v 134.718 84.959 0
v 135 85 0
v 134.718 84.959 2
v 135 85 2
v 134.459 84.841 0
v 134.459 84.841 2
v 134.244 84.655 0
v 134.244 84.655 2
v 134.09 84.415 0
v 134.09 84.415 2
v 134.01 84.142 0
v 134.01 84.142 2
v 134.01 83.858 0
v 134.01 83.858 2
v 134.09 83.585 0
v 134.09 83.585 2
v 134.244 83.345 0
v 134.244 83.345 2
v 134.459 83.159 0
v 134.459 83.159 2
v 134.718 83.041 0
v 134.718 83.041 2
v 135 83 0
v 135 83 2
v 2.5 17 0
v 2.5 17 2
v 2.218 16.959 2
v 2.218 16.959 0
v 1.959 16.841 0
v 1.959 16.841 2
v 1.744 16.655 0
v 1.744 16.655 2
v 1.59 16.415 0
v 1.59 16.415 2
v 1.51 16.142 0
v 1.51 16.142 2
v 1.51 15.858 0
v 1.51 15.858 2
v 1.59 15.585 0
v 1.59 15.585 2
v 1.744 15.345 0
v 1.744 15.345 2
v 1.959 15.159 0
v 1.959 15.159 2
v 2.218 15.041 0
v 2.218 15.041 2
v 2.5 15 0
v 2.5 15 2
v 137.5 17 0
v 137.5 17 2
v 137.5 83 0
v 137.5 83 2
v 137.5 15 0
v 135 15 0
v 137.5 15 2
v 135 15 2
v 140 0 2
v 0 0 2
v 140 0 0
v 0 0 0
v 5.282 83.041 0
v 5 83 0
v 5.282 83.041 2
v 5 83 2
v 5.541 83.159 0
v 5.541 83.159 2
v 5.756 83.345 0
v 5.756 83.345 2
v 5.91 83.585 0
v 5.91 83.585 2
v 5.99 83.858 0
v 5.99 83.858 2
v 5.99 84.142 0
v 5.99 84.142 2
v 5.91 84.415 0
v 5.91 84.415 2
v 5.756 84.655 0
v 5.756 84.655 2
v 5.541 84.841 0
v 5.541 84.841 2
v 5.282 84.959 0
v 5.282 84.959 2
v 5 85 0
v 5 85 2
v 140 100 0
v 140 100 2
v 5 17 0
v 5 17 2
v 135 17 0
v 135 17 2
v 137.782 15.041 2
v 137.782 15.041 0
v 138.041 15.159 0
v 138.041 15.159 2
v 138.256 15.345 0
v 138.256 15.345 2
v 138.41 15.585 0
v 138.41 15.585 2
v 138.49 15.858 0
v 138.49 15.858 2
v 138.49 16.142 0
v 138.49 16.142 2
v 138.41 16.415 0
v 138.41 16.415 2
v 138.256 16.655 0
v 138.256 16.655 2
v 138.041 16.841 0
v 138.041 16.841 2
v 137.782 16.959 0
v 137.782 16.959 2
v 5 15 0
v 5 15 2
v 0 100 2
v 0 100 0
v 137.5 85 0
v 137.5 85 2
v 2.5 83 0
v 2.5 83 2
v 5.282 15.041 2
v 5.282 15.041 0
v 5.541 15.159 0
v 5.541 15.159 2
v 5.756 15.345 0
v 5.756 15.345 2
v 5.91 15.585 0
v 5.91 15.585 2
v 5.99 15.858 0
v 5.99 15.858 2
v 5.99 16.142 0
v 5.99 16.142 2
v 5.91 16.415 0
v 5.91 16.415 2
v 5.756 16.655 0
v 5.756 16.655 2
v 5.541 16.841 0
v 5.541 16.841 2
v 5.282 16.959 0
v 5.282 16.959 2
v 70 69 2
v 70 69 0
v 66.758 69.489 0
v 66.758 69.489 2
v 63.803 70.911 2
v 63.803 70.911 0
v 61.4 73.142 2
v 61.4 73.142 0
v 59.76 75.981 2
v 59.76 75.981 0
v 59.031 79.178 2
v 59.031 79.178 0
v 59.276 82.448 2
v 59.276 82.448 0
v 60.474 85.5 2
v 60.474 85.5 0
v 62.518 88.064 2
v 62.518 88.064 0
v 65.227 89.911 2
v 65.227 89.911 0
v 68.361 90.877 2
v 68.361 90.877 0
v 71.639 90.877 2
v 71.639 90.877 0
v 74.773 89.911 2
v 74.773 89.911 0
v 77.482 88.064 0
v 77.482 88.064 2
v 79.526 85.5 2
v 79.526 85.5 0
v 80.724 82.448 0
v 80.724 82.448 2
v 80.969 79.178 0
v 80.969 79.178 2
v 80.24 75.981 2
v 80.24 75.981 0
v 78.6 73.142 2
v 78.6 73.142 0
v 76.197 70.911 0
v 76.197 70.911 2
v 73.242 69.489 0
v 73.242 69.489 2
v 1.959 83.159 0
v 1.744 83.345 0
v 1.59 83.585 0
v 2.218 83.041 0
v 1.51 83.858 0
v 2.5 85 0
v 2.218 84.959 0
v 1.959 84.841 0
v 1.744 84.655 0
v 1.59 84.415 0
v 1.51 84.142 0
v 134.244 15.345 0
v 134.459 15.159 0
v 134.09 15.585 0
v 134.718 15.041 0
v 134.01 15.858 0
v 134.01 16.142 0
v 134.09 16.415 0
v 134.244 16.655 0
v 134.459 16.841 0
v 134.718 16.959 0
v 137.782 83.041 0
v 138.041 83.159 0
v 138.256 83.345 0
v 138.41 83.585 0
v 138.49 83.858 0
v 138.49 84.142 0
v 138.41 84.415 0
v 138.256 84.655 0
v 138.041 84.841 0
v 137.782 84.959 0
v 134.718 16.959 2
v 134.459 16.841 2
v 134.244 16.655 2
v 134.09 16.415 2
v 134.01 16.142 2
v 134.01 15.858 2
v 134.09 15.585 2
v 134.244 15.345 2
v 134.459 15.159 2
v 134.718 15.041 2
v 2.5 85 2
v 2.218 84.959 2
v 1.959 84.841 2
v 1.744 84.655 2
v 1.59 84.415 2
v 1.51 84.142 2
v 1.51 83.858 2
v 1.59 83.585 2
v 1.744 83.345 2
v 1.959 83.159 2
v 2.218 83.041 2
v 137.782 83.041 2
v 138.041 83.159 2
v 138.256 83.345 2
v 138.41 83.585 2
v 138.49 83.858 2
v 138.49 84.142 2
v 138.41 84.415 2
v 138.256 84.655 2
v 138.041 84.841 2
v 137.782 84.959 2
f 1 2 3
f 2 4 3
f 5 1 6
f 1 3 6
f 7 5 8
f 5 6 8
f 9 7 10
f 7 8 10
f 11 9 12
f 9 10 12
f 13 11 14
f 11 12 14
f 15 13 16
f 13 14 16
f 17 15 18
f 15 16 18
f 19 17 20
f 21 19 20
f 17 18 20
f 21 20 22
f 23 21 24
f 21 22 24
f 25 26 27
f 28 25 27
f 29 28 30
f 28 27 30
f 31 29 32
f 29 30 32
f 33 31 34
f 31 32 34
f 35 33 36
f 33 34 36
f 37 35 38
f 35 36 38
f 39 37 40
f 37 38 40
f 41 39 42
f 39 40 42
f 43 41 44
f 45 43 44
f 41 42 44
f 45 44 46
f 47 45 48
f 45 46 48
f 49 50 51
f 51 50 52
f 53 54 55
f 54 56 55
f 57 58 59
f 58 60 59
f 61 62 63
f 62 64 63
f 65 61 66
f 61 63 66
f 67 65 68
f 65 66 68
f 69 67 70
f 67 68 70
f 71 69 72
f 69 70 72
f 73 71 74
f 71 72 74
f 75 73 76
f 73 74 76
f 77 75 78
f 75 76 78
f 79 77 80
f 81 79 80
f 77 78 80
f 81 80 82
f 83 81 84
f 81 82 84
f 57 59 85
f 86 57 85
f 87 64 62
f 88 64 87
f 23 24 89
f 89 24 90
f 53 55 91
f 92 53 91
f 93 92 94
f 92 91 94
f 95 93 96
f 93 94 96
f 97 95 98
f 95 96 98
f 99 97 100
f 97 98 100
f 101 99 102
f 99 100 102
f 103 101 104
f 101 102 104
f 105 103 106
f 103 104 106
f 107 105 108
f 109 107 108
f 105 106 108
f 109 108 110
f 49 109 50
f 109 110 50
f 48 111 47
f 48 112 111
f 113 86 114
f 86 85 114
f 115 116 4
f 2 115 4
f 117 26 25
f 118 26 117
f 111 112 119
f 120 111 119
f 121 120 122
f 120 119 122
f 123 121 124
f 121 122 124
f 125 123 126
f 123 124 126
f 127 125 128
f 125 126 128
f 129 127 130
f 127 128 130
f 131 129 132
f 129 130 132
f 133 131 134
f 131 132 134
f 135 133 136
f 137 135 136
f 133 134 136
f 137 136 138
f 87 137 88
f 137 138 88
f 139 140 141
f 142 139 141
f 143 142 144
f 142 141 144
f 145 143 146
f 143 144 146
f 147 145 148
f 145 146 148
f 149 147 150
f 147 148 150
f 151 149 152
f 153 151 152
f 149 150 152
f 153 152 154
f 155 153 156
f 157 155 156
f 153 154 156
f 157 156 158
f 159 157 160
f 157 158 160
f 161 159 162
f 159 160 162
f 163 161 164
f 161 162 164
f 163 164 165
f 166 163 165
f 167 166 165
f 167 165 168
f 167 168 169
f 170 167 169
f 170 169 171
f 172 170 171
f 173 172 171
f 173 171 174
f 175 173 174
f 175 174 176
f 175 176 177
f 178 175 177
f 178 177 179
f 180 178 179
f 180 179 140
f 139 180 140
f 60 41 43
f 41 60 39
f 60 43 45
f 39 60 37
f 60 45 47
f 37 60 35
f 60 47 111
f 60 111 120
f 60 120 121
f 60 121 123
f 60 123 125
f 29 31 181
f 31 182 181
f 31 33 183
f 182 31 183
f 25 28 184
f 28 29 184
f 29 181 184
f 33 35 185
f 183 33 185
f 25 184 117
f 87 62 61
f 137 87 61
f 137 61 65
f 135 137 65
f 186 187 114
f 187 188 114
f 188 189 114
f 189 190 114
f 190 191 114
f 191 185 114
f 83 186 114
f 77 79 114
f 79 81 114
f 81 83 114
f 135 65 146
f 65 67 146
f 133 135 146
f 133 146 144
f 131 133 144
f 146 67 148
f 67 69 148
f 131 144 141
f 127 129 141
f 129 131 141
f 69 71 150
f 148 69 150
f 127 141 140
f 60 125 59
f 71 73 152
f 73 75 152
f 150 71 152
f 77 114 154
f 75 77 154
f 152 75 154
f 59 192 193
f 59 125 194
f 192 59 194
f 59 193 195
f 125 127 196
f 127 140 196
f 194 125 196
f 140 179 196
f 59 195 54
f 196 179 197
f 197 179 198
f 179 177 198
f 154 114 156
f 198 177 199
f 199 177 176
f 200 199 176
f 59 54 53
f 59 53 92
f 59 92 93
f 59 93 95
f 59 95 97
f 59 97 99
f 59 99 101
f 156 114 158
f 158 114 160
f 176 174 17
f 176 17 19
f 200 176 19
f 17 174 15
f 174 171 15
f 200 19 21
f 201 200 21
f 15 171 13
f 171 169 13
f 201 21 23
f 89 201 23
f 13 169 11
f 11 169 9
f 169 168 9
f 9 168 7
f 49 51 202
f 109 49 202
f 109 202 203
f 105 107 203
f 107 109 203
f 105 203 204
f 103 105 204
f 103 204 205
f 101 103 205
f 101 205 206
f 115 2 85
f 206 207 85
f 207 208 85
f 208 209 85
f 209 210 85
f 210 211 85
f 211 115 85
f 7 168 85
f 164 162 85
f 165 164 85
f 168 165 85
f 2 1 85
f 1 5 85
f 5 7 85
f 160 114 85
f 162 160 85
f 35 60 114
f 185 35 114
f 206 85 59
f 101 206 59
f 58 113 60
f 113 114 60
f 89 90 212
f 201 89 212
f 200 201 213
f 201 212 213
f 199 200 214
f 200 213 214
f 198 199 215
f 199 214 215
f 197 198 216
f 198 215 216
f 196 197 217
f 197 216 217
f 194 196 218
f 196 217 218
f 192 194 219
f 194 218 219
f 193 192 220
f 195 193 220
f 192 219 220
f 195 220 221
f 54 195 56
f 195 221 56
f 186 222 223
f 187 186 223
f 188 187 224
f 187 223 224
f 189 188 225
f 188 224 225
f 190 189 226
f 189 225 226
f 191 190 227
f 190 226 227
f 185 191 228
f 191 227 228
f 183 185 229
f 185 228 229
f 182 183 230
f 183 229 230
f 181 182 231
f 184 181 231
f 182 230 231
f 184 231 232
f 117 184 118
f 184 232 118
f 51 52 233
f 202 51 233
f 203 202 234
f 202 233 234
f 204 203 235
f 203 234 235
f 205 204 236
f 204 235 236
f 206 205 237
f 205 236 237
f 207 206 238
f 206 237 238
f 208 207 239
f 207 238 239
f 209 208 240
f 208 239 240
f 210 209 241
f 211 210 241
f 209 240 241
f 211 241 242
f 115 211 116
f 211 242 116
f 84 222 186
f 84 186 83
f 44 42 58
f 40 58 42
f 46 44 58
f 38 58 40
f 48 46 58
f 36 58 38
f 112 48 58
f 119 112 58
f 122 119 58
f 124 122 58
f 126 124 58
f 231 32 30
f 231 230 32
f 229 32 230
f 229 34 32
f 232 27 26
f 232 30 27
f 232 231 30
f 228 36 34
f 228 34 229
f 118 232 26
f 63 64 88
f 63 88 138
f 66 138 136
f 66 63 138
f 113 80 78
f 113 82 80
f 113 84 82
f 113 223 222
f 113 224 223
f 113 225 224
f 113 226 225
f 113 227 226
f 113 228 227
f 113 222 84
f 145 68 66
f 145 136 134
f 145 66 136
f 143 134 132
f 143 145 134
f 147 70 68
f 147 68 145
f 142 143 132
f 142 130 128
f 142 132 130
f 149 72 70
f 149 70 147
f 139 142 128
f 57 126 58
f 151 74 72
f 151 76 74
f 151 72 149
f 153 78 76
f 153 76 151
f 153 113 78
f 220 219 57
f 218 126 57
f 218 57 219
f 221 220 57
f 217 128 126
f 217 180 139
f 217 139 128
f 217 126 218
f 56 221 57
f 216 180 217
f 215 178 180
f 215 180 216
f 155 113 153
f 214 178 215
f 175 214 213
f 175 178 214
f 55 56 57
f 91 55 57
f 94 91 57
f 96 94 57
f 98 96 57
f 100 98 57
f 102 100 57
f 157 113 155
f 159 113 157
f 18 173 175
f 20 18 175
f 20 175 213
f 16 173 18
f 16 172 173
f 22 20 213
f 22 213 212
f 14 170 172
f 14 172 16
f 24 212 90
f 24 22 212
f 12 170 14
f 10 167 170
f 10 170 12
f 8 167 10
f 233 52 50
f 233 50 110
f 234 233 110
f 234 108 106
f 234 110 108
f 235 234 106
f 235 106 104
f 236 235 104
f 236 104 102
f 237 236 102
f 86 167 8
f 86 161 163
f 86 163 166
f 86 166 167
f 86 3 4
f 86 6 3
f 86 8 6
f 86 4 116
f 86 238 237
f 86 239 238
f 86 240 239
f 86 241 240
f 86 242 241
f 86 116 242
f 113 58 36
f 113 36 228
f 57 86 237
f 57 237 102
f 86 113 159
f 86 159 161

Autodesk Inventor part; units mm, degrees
ref_plane "YZ Plane" through (0, 0, 0) normal (1, 0, 0) x (0, 1, 0)
ref_plane "XZ Plane" through (0, 0, 0) normal (0, 1, 0) x (-1, 0, 0)
ref_plane "XY Plane" through (0, 0, 0) normal (0, 0, 1) x (1, 0, 0)
sketch "スケッチ1" plane through (0, 0, 0) normal (0, 0, 1) x (1, 0, 0)
  line L0 (0, 0) -> (140, 0)
  line L1 (140, 0) -> (140, 100)
  line L2 (140, 100) -> (0, 100)
  line L3 (0, 100) -> (0, 0)
  dimension "d0" = 140
  dimension "d1" = 100
extrude "押し出し1" add sketch "スケッチ1" along normal blind 2
sketch "スケッチ2" plane through (0, 0, 2) normal (0, 0, 1) x (1, 0, 0)
  line L0 (140, 100) -> (0, 100) projected
  line L1 (70, 100) -> (70, 0) construction
  line L2 (0, 0) -> (140, 0) projected
  line L3 (2.5, 85) -> (5, 85)
  line L4 (5, 83) -> (5, 17)
  line L5 (5, 15) -> (2.5, 15)
  line L6 (2.5, 17) -> (2.5, 83)
  line L7 (0, 100) -> (0, 0) projected
  line L8 (0, 50) -> (140, 50) construction
  line L9 (140, 0) -> (140, 100) projected
  arc A0 (2.5, 85) -> (2.5, 83) centre (2.5, 84) ccw
  arc A1 (5, 83) -> (5, 85) centre (5, 84) ccw
  arc A2 (2.5, 17) -> (2.5, 15) centre (2.5, 16) ccw
  arc A3 (5, 15) -> (5, 17) centre (5, 16) ccw
  line L10 (137.5, 85) -> (135, 85)
  line L11 (135, 83) -> (135, 17)
  line L12 (135, 15) -> (137.5, 15)
  line L13 (137.5, 17) -> (137.5, 83)
  line L14 (140, 50) -> (0, 50) construction
  arc A4 (137.5, 83) -> (137.5, 85) centre (137.5, 84) ccw
  arc A5 (135, 85) -> (135, 83) centre (135, 84) ccw
  arc A6 (137.5, 15) -> (137.5, 17) centre (137.5, 16) ccw
  arc A7 (135, 17) -> (135, 15) centre (135, 16) ccw
  dimension "d4" = 2.5
  dimension "d5" = 2.5
  dimension "d6" = 70
  dimension "d7" = 2
  dimension "d8" = 2
  dimension "d9" = 2
  dimension "d10" = 2
extrude "押し出し2" cut sketch "スケッチ2" against normal through all contours L3 A1 L4 A3 L5 A2 L6 A0 | A4 L13 A6 L12 A7 L11 A5 L10
sketch "スケッチ3" plane through (0, 0, 2) normal (0, 0, 1) x (1, 0, 0)
  line L0 (140, 100) -> (0, 100) projected
  line L1 (70, 100) -> (70, 0) construction
  line L2 (0, 0) -> (140, 0) projected
  point P0 (70, 80)
  dimension "d13" = 20
hole "穴1" at (70, 80, 2) direction (0, 0, -1) diameter 22 end through all
properties part number "body_top"
